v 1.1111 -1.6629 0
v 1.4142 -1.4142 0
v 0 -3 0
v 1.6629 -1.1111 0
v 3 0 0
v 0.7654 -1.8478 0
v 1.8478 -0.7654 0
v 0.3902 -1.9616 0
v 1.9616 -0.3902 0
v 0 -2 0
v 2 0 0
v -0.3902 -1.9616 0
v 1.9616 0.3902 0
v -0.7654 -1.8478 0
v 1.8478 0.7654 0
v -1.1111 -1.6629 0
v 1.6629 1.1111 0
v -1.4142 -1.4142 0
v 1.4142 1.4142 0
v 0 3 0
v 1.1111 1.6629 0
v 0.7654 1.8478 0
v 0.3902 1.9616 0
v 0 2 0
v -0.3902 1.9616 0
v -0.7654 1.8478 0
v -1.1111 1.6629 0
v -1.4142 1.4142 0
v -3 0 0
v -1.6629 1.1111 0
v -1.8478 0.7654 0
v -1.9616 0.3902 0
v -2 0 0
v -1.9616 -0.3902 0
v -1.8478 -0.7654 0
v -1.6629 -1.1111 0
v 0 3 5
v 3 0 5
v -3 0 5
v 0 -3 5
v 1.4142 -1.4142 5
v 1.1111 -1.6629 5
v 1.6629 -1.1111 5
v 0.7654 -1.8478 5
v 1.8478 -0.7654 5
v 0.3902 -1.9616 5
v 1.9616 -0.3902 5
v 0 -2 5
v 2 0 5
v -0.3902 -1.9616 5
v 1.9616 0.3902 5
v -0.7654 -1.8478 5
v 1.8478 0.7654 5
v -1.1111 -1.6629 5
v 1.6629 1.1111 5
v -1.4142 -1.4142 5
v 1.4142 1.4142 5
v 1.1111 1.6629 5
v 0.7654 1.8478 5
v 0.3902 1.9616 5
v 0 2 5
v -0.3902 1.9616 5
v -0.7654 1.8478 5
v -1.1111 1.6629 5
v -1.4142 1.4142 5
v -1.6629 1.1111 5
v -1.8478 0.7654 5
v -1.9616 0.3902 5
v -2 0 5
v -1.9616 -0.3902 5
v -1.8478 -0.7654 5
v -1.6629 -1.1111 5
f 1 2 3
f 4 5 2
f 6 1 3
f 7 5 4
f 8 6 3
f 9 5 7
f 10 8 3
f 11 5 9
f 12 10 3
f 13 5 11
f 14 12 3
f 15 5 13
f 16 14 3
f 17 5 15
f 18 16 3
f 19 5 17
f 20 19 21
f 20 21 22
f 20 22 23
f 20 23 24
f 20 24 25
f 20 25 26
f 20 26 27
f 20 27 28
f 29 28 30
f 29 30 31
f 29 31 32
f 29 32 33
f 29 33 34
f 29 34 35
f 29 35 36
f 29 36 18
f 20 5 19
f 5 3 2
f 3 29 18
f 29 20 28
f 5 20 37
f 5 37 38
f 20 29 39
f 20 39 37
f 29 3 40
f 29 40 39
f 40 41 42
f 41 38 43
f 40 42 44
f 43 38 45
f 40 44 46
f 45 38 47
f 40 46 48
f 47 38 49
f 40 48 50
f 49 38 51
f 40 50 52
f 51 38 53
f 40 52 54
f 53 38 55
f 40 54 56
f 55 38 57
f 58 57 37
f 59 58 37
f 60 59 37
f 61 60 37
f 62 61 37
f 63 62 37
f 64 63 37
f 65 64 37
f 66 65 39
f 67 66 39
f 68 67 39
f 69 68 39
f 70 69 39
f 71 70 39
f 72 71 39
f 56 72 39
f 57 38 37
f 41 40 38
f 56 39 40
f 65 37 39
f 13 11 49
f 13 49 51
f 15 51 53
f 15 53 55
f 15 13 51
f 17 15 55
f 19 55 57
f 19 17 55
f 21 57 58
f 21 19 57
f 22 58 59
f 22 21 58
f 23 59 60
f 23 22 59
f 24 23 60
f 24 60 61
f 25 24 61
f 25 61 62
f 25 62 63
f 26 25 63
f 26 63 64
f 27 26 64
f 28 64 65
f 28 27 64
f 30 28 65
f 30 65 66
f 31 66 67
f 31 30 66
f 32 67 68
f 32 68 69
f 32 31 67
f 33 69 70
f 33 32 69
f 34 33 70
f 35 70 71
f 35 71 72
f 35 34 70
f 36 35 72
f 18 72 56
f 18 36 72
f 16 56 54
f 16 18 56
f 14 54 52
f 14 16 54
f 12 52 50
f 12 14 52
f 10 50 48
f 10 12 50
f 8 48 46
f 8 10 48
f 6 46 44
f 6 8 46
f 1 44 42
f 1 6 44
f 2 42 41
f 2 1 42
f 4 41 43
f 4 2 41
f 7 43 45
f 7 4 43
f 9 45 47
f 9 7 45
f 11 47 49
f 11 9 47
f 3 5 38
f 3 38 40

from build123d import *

# Parameters (mm, degrees)
CROQUIS1_R              = 2
SALIENTE_EXTRUIR1_DEPTH = 5


with BuildPart() as part:
    # Croquis1 → Saliente-Extruir1 (new body)
    with BuildSketch(Plane.XY):
        Polygon((0, 3), (3, 0), (0, -3), (-3, 0), align=None)
        Circle(CROQUIS1_R, mode=Mode.SUBTRACT)
    extrude(amount=SALIENTE_EXTRUIR1_DEPTH)


solid = part.part
